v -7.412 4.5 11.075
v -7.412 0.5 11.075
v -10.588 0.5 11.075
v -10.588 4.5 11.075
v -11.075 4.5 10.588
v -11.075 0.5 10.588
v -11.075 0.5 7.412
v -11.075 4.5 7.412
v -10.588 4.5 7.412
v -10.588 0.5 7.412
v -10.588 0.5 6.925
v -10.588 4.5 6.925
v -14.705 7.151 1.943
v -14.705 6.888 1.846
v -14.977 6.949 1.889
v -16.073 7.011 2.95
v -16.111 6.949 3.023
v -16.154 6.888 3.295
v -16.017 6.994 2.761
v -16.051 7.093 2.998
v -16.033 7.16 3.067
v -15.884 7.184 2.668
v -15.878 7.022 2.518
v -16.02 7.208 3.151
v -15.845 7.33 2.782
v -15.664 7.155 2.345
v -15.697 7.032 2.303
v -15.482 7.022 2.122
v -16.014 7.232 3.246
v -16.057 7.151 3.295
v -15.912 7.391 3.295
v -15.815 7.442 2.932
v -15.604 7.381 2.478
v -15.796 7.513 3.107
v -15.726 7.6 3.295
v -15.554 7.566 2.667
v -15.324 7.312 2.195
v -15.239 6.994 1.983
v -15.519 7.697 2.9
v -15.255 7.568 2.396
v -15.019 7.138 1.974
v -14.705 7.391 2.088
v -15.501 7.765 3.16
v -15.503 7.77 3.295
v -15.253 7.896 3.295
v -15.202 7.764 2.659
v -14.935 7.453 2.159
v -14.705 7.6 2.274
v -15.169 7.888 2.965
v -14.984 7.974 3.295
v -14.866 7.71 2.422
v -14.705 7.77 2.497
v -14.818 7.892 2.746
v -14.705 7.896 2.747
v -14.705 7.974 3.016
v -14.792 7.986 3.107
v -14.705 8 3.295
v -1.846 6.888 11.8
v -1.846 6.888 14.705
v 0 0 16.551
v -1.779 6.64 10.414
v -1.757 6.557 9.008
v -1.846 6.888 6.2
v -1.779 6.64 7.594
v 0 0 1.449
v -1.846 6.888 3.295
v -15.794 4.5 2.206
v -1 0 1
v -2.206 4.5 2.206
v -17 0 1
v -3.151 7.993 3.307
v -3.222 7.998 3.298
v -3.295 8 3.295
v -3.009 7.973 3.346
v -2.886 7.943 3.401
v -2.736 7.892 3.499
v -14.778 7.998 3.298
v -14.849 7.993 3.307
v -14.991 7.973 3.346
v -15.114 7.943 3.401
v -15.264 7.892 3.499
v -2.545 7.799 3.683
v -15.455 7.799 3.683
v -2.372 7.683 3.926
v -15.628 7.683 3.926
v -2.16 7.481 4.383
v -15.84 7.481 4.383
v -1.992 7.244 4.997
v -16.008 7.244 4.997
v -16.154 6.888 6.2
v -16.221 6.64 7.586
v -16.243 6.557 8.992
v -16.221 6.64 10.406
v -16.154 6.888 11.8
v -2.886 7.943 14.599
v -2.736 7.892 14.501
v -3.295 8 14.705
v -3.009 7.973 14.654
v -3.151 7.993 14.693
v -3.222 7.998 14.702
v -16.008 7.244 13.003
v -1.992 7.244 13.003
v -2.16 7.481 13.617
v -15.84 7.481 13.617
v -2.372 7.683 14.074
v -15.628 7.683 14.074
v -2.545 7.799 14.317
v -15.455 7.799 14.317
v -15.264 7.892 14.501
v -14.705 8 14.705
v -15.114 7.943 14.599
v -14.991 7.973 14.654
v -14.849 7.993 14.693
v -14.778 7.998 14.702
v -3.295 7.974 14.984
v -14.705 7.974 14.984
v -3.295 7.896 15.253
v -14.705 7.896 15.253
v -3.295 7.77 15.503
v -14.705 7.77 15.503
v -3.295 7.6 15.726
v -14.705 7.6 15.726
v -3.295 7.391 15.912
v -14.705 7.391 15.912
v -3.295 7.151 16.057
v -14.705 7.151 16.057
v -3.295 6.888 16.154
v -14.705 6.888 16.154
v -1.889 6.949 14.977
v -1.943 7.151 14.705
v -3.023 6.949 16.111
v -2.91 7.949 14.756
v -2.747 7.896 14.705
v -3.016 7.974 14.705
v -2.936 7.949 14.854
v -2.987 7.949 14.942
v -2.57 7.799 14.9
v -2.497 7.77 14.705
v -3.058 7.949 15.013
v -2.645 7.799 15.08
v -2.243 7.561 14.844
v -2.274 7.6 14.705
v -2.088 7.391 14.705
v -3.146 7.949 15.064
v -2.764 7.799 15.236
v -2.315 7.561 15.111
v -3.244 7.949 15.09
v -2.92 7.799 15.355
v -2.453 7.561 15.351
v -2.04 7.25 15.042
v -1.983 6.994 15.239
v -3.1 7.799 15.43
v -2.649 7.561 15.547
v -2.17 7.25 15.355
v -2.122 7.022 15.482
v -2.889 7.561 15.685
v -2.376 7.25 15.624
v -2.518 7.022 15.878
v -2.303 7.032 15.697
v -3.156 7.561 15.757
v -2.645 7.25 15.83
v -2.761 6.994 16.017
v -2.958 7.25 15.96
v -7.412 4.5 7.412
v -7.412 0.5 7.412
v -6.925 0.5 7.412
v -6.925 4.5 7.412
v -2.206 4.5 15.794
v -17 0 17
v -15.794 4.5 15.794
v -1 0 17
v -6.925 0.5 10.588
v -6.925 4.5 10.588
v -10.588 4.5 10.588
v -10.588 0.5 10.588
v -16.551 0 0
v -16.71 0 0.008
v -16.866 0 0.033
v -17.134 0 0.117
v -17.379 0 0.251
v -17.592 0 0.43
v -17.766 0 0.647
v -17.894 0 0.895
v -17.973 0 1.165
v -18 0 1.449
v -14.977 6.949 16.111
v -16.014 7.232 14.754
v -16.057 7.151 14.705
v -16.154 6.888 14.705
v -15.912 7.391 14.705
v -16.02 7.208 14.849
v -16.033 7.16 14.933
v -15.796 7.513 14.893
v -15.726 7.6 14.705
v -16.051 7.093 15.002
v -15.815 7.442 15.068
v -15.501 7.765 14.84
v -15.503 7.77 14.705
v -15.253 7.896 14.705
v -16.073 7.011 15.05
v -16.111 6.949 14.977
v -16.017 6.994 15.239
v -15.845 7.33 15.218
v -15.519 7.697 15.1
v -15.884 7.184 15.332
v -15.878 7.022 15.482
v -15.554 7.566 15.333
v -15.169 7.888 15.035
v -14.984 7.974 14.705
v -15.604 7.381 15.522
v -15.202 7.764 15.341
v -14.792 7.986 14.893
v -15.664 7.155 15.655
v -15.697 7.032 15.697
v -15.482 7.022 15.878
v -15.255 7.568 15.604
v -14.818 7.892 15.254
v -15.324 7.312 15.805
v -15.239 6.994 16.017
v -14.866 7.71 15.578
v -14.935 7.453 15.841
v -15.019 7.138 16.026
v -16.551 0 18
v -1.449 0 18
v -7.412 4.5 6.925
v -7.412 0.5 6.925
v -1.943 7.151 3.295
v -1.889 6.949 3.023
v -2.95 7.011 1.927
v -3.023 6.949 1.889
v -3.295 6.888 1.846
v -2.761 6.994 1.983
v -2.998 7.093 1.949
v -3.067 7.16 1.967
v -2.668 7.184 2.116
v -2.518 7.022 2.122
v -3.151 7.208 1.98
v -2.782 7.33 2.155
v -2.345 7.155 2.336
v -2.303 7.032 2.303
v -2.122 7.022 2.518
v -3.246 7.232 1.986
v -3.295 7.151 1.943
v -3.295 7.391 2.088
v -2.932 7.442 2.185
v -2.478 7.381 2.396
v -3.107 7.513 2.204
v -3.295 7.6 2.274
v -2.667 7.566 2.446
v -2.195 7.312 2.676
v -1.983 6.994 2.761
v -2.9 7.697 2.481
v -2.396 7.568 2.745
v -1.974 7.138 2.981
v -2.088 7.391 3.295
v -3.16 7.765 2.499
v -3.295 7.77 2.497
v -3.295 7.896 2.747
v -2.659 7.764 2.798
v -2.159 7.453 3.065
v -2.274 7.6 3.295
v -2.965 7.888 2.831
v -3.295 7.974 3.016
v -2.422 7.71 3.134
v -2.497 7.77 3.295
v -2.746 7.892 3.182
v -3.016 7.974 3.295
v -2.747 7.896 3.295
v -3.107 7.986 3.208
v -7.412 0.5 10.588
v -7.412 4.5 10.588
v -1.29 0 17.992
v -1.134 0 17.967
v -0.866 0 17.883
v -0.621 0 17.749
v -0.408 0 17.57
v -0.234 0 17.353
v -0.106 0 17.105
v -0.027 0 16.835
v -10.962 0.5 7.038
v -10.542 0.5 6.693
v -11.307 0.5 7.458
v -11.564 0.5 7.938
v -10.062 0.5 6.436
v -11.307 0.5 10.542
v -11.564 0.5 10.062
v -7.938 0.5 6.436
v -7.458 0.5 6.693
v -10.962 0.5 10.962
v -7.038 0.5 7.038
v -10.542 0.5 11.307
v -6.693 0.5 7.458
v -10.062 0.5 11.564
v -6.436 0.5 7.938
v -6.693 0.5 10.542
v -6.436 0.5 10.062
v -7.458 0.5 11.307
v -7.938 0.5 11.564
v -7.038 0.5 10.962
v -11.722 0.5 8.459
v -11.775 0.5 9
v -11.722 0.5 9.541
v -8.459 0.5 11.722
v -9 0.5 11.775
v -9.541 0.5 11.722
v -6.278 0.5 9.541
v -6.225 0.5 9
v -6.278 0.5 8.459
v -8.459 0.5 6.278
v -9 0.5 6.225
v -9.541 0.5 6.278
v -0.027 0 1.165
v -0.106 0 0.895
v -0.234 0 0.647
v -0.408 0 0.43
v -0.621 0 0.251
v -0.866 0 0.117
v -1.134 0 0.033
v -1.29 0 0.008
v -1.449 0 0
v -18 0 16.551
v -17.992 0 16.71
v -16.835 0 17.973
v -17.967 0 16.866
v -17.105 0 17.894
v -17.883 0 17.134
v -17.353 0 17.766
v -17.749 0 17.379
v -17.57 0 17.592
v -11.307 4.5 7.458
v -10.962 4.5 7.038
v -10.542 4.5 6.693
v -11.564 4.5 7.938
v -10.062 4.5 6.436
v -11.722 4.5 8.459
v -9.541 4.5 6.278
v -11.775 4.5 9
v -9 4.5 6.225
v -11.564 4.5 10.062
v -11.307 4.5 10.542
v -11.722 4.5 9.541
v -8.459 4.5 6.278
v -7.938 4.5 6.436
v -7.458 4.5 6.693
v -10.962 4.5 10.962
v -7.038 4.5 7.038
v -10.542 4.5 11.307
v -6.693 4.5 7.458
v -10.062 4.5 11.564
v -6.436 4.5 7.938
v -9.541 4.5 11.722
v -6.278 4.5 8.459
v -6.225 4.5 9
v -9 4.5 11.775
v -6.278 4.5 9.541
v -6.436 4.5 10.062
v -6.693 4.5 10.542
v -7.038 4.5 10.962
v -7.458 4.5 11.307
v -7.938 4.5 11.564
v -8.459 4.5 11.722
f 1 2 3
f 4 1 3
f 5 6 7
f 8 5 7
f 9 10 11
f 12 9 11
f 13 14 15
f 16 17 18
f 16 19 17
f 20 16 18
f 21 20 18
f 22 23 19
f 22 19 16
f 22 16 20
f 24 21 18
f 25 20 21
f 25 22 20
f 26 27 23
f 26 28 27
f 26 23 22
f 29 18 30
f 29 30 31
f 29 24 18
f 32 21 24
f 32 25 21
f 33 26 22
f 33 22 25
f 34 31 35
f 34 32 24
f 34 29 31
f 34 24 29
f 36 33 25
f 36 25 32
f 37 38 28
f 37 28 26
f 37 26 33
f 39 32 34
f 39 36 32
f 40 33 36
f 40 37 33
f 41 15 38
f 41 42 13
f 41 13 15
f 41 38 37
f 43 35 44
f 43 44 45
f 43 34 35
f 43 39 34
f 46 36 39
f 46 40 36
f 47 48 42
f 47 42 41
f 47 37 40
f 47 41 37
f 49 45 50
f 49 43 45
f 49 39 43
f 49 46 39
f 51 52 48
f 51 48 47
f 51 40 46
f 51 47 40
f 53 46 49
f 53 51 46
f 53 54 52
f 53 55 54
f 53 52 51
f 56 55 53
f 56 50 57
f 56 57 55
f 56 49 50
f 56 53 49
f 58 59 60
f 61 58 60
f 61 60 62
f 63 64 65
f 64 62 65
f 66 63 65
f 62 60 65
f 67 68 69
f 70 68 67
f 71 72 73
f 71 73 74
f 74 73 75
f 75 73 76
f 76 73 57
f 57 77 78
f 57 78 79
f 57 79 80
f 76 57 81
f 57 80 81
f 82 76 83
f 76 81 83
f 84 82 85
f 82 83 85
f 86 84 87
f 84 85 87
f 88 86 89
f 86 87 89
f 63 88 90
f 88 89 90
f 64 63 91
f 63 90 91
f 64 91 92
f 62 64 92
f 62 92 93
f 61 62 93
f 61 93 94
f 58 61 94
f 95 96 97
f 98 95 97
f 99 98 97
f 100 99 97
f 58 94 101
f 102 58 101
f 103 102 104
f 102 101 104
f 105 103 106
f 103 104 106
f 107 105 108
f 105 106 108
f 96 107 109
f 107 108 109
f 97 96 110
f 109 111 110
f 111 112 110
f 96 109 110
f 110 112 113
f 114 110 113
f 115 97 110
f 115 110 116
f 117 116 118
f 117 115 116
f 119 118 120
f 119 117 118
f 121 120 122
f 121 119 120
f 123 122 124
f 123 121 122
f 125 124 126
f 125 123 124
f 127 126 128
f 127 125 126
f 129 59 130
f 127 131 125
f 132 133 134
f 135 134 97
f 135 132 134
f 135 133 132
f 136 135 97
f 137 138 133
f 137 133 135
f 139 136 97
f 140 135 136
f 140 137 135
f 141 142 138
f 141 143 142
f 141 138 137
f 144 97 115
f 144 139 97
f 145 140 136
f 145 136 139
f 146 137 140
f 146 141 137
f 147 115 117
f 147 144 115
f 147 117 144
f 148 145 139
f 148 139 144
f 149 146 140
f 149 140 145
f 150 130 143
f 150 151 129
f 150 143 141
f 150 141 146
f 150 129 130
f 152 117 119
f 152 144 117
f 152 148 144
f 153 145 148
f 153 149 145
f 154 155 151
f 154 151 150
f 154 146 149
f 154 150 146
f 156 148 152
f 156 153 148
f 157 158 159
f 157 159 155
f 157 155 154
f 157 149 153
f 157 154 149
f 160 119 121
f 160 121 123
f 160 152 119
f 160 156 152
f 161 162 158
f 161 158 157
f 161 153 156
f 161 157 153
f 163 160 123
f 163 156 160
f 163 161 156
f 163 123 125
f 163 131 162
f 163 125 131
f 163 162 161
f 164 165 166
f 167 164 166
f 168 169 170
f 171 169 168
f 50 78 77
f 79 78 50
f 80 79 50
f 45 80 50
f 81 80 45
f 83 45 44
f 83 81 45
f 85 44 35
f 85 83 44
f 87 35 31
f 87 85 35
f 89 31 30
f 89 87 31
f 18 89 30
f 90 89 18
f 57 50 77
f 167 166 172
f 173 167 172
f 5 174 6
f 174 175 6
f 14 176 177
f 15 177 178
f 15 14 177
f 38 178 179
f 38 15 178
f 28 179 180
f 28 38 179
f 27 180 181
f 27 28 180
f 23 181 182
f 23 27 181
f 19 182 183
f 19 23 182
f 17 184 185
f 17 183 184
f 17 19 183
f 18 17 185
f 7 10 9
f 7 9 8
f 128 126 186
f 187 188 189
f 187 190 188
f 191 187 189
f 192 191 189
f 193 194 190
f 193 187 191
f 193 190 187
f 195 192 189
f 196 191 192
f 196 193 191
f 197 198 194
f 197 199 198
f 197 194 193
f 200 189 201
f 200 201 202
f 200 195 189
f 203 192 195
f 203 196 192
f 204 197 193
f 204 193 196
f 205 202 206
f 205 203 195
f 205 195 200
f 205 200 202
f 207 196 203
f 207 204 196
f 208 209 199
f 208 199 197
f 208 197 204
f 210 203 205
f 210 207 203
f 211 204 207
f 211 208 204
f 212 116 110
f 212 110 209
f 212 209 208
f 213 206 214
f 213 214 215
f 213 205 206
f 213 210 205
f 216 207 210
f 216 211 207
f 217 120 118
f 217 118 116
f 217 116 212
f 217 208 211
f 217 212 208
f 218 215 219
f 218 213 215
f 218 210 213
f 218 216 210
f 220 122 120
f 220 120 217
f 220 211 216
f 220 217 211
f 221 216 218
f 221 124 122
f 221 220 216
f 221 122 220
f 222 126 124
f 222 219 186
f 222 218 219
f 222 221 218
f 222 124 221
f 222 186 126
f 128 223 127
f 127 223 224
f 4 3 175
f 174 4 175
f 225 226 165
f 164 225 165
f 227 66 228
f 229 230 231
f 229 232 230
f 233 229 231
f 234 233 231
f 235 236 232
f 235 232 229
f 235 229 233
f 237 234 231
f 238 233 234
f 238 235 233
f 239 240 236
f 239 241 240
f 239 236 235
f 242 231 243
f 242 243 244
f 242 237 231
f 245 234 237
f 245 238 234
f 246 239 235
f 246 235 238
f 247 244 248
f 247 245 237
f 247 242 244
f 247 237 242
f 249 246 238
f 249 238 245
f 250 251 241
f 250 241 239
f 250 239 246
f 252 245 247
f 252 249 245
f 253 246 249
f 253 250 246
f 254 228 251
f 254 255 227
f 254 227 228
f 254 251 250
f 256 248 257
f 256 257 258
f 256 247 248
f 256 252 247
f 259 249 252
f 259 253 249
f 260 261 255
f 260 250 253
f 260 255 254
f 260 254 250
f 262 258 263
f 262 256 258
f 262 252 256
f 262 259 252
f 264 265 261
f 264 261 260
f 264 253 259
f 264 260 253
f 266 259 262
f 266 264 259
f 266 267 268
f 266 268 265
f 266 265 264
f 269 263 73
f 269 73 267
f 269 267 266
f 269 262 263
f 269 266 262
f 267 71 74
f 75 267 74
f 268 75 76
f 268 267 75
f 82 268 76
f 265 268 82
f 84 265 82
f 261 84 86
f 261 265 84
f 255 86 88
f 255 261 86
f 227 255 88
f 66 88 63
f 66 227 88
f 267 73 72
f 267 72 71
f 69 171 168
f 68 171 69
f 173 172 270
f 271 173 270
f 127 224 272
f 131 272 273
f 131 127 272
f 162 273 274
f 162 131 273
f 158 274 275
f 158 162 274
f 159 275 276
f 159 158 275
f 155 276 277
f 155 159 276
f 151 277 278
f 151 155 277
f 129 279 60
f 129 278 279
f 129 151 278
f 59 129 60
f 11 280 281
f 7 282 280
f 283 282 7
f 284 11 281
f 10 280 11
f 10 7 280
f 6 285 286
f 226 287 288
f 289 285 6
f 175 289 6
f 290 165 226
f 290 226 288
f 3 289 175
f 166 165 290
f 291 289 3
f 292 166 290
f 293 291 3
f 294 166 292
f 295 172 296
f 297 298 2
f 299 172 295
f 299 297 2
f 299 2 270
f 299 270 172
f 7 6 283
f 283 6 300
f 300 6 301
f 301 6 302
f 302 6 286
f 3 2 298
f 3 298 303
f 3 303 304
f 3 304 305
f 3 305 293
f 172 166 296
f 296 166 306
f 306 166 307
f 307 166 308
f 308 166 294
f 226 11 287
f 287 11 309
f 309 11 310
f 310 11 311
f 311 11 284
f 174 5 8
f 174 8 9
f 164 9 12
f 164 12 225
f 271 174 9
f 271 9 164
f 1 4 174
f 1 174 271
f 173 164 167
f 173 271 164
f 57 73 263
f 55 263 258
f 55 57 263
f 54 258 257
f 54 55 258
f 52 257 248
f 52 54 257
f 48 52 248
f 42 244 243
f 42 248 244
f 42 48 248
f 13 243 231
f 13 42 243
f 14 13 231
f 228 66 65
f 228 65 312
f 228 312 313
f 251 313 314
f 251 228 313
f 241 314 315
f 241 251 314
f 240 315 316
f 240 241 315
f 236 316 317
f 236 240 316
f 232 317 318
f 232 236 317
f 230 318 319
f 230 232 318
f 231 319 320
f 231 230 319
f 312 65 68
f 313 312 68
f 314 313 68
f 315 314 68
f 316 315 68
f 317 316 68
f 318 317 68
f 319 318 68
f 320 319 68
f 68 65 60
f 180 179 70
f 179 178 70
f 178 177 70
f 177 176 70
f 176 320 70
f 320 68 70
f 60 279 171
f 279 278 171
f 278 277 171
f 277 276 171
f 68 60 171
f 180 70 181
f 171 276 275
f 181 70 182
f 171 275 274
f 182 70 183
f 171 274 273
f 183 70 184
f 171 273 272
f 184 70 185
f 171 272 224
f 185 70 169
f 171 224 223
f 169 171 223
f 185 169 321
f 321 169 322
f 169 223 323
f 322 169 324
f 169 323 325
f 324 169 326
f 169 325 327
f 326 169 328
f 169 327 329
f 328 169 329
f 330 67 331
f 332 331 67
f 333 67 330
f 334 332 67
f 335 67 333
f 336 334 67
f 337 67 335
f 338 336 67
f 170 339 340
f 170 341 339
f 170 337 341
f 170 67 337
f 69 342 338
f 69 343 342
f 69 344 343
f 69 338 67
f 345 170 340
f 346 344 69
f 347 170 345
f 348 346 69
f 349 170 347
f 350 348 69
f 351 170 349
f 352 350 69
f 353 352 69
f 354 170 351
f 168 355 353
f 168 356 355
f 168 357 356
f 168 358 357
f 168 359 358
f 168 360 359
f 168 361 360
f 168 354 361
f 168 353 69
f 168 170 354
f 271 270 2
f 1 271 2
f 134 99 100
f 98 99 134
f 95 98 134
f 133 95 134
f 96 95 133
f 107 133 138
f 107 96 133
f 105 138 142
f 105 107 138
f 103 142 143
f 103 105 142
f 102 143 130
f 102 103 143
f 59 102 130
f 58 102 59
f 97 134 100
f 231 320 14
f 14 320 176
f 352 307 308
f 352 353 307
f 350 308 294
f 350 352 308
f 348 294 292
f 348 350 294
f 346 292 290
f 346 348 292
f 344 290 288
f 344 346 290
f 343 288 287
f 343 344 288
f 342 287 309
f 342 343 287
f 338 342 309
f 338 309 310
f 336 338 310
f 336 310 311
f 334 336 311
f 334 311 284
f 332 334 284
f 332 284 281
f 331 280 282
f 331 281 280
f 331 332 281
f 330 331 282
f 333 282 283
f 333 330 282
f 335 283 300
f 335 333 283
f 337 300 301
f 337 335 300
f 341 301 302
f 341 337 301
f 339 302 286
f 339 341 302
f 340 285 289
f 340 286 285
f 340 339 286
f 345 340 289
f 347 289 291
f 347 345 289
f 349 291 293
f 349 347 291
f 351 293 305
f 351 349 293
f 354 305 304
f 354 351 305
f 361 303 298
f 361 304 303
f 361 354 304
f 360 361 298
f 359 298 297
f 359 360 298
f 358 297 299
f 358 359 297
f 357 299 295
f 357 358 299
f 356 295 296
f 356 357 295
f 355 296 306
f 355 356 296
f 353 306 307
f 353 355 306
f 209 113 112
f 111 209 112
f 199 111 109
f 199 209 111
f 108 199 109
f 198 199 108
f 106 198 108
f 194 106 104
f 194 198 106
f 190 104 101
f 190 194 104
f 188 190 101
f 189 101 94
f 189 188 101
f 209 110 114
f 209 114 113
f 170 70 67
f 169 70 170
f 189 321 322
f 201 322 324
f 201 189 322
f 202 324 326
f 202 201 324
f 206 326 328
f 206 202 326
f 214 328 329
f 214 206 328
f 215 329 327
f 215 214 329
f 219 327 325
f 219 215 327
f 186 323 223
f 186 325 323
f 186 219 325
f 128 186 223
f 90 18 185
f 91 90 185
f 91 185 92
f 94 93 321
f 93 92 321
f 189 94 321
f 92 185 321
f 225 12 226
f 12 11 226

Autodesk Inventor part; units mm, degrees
ref_plane "YZ Plane" through (0, 0, 0) normal (1, 0, 0) x (0, 1, 0)
ref_plane "XZ Plane" through (0, 0, 0) normal (0, 1, 0) x (-1, 0, 0)
sketch "Sketch1" plane through (0, 0, 0) normal (0, 1, 0) x (-1, 0, 0)
  line L0 (0, 0) -> (18, 0)
  line L1 (18, 0) -> (18, 18)
  line L2 (18, 18) -> (0, 18)
  line L3 (0, 18) -> (0, 0)
  dimension "d0" = 18
  dimension "d1" = 18
extrude "Extrusion1" add sketch "Sketch1" along normal blind 8 draft -15
fillet "Fillet1" radius 1.5 8 edges at (-1.0718, 4, 16.9282) (-9, 8, 15.8564) (-2.1436, 8, 9) (-9, 8, 2.1436) (-1.0718, 4, 1.0718) (-16.9282, 4, 1.0718) (-16.9282, 4, 16.9282) (-15.8564, 8, 9)
ref_plane "Work Plane1" through (-9, 33.5885, 16.5511) normal (1, 0, 0) x (0, 0, -1)
sketch "Sketch2" plane through (-9, 33.5885, 16.5511) normal (1, 0, 0) x (0, 0, -1)
  line L0 (13.2565, -25.5885) -> (1.8457, -25.5885) projected
  arc A0 (14.7054, -26.7002) -> (13.2565, -25.5885) centre (13.2565, -27.0885) ccw projected
  arc A1 (1.8457, -25.5885) -> (13.2565, -25.5885) centre (7.5511, -15.0316) ccw
  point P0 (16.5511, -33.5885)
  point P1 (13.2565, -25.5885)
  dimension "d5" = 12
extrude "Extrusion2" cut sketch "Sketch2" along normal through all both and the other way through all
sketch "Sketch3" plane through (0, 0, 0) normal (0, -1, 0) x (1, 0, 0)
  line L0 (-16.5511, 18) -> (-1.4489, 18) construction
  line L1 (-9, 18) -> (-9, 0) construction
  line L2 (-1.4489, 0) -> (-16.5511, 0) construction
  line L3 (-18, 1.4489) -> (-18, 16.5511) construction
  line L4 (-18, 9) -> (0, 9) construction
  line L5 (-1, 1) -> (-17, 1)
  line L6 (-17, 1) -> (-17, 17)
  line L7 (-17, 17) -> (-1, 17)
  line L8 (-1, 17) -> (-1, 1)
  line L9 (-1, 1) -> (-17, 17) construction
  line L10 (-17, 1) -> (-1, 17) construction
  point P0 (0, 0)
  point P1 (-9, 9)
  point P2 (-9, 9)
  dimension "d8" = 16
  dimension "d9" = 16
extrude "Extrusion3" cut sketch "Sketch3" against normal blind 4.5 draft -15
sketch "Sketch4" plane through (0, 4.5, 0) normal (0, -1, 0) x (1, 0, 0)
  line L0 (-15.7942, 15.7942) -> (-15.7942, 2.2058) construction
  line L1 (-15.7942, 9) -> (-2.2058, 9) construction
  line L2 (-2.2058, 2.2058) -> (-2.2058, 15.7942) construction
  line L3 (-2.2058, 15.7942) -> (-15.7942, 15.7942) construction
  line L4 (-9, 15.7942) -> (-9, 2.2058) construction
  line L5 (-15.7942, 2.2058) -> (-2.2058, 2.2058) construction
  circle A0 centre (-9, 9) radius 2.775
  point P0 (0, 0)
  dimension "d12" = 5.55
extrude "Extrusion4" add sketch "Sketch4" along normal blind 4
sketch "Sketch5" plane through (-9, 0.5, 9) normal (0, -1, 0) x (1, 0, 0)
  line L0 (1.5875, 2.075) -> (-1.5875, 2.075)
  line L1 (-1.5875, -2.075) -> (1.5875, -2.075)
  line L2 (-1.5875, 2.075) -> (1.5875, -2.075) construction
  line L3 (-2.075, 1.5875) -> (-2.075, -1.5875)
  line L4 (2.075, -1.5875) -> (2.075, 1.5875)
  line L5 (2.075, 1.5875) -> (-2.075, -1.5875) construction
  line L6 (-2.075, 1.5875) -> (2.075, -1.5875) construction
  line L7 (-6.7942, 6.7942) -> (-6.7942, -6.7942) construction
  line L8 (-6.7942, 0) -> (6.7942, 0) construction
  line L9 (6.7942, -6.7942) -> (6.7942, 6.7942) construction
  line L10 (-6.7942, -6.7942) -> (6.7942, -6.7942) construction
  line L11 (0, -6.7942) -> (0, 6.7942) construction
  line L12 (-1.5875, 2.075) -> (-1.5875, 1.8875)
  line L13 (-1.5875, -1.8875) -> (-1.5875, -2.075)
  line L14 (-2.075, -1.5875) -> (-1.8875, -1.5875)
  line L15 (-1.8875, 1.5875) -> (-2.075, 1.5875)
  line L16 (0, 0) -> (-1.5875, -2.075) construction
  line L17 (2.075, 1.5875) -> (1.8875, 1.5875)
  line L18 (1.8875, -1.5875) -> (2.075, -1.5875)
  line L19 (1.5875, -2.075) -> (1.5875, -1.8875)
  line L20 (1.5875, 1.8875) -> (1.5875, 2.075)
  line L21 (-1.5875, 1.8875) -> (-1.5875, -1.8875)
  line L22 (1.8875, 1.5875) -> (1.5875, 1.5875)
  line L23 (-1.5875, 1.5875) -> (-1.8875, 1.5875)
  line L24 (1.5875, -1.8875) -> (1.5875, -1.5875)
  line L25 (1.5875, 1.2145) -> (1.5875, 1.8875)
  line L26 (1.8875, -1.5875) -> (1.5875, -1.5875)
  line L27 (-1.5875, -1.5875) -> (-1.8875, -1.5875)
  point P0 (9, -9)
  dimension "d15" = 3.175
  dimension "d16" = 4.15
  dimension "d17" = 4.15
  dimension "d18" = 3.175
extrude "Extrusion5" cut sketch "Sketch5" against normal blind 4
properties part number "Keycap"
